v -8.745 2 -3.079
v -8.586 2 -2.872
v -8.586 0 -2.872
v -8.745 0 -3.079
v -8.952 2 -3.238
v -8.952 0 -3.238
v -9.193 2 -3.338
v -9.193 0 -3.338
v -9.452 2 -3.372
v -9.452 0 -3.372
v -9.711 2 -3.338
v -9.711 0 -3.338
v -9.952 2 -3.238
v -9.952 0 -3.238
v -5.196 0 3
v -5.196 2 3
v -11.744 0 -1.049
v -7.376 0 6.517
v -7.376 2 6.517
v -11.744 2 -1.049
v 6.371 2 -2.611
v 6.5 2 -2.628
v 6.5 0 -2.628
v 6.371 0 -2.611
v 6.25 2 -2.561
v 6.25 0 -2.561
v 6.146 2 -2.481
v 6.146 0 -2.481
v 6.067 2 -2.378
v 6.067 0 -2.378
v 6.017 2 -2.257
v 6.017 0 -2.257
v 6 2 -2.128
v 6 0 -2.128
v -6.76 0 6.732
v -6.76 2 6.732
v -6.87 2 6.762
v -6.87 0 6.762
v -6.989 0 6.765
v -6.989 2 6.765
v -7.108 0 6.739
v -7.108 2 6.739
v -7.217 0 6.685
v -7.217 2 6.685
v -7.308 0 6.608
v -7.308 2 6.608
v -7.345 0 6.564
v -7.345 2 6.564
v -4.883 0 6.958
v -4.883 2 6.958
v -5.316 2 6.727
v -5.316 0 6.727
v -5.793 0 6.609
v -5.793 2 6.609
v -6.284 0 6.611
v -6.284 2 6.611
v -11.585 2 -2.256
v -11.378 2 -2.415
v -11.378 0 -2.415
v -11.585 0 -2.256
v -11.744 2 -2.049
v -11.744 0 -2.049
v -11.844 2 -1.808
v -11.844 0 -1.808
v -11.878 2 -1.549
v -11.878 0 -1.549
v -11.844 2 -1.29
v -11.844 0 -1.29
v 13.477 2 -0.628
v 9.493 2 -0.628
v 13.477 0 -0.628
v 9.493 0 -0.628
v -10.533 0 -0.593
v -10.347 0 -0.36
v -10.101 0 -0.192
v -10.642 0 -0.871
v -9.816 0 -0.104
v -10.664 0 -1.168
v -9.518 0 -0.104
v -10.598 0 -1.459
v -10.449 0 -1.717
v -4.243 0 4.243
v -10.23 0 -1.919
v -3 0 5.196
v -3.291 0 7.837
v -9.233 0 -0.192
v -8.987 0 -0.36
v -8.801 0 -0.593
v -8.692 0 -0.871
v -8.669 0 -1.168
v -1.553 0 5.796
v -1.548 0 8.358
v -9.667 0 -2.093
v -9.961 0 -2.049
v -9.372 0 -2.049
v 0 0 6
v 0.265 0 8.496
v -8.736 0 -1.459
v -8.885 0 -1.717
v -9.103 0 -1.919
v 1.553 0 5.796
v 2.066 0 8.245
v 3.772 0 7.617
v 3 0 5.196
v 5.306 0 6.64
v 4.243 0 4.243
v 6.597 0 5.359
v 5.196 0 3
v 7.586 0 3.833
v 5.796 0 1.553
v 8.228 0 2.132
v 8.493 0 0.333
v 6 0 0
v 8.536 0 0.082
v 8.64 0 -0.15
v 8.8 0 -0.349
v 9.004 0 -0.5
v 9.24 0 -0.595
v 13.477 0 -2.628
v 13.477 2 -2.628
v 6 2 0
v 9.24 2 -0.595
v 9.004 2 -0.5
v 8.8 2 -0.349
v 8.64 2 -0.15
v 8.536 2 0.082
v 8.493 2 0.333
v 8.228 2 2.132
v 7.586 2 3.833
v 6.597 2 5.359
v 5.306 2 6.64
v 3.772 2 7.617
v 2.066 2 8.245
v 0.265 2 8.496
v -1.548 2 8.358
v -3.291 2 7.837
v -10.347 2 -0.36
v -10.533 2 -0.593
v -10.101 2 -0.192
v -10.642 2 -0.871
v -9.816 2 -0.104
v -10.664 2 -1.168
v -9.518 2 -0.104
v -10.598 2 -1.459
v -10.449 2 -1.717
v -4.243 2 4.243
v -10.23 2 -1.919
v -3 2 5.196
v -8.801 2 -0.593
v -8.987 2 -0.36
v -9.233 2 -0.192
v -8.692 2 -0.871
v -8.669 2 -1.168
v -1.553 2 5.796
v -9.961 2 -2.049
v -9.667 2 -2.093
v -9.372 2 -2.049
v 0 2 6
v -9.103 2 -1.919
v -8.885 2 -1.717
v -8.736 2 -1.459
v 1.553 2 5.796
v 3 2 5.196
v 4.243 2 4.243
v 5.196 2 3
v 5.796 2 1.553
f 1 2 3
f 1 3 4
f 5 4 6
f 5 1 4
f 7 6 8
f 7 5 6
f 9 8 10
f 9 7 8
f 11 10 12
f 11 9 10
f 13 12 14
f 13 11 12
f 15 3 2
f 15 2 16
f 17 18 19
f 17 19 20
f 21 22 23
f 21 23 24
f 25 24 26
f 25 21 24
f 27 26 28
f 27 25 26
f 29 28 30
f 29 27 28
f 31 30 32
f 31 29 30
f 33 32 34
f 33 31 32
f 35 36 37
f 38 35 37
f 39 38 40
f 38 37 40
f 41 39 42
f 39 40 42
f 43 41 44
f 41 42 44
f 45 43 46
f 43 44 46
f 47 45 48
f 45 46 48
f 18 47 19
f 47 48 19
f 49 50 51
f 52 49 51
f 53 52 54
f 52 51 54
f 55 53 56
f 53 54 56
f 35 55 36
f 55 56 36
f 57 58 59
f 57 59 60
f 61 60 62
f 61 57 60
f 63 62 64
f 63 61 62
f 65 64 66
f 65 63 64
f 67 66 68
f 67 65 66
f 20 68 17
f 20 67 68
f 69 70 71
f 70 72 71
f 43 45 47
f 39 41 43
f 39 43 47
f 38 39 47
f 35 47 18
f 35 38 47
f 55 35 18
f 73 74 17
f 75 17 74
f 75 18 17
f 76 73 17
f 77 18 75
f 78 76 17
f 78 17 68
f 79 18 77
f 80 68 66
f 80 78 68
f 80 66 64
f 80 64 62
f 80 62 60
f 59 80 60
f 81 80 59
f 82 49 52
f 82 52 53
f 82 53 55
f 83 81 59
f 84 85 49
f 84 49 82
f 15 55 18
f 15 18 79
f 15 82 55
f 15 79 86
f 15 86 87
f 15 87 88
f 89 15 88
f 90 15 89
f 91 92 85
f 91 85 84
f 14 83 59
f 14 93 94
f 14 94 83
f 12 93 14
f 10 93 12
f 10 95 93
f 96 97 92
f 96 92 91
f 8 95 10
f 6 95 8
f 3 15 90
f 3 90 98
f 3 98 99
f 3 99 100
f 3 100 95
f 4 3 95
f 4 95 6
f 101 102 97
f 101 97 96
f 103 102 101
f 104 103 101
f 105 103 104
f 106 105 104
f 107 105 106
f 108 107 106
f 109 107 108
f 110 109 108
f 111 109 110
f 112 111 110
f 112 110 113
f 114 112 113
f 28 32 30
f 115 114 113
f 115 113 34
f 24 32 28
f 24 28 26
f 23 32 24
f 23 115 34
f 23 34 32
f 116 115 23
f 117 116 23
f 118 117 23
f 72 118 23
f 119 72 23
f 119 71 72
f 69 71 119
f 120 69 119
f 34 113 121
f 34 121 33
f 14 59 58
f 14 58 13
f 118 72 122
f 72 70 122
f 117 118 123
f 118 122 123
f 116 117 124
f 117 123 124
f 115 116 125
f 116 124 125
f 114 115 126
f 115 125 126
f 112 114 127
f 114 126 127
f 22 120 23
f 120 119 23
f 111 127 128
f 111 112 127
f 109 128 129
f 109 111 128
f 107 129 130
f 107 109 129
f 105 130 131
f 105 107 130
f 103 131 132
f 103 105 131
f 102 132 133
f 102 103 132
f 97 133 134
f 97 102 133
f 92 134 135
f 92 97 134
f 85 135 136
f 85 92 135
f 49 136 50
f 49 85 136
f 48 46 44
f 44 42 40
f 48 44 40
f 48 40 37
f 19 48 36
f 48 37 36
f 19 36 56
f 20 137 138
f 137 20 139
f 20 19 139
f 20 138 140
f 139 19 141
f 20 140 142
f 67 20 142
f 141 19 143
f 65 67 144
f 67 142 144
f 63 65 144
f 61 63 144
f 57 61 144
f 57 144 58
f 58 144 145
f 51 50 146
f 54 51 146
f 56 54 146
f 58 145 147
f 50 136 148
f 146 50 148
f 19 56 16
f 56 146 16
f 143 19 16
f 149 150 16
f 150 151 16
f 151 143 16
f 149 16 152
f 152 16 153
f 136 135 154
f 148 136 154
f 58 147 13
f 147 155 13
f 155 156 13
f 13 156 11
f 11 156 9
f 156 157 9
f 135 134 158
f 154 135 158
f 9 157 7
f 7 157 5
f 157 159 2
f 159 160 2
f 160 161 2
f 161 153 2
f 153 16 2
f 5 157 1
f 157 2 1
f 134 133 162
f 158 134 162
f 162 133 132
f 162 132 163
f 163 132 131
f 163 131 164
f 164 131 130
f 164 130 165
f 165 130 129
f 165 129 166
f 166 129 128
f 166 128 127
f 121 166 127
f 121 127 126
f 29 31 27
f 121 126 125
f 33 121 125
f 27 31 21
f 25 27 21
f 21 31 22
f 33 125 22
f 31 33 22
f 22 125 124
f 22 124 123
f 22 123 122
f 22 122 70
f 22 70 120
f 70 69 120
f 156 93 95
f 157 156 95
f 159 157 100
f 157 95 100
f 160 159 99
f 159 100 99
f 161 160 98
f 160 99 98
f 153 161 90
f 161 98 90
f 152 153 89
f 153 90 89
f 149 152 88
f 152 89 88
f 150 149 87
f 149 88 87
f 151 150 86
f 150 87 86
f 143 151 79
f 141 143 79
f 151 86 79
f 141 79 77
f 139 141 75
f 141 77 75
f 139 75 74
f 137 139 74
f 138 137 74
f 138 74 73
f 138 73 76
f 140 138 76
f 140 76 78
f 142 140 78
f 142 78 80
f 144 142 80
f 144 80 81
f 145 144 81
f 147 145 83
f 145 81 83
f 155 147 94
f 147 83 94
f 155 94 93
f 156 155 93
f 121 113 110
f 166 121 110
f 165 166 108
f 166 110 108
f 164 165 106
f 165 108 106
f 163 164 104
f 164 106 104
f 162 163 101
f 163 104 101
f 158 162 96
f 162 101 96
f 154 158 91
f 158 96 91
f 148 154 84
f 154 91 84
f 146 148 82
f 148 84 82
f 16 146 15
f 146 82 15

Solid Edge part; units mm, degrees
sketch "Sketch1" plane through (0, 0, 0) normal (0, -1, 0) x (1, 0, 0)
  line L0 (-5.8407, 6.1754) -> (-7.1398, 6.9254)
  line L1 (-7.1398, 6.9254) -> (-12.2436, -1.9148)
  line L2 (-12.2436, -1.9148) -> (-9.0862, -3.7377)
  line L3 (-9.0862, -3.7377) -> (-5.1962, 3)
  line L4 (6, 0) -> (6, -2.6279)
  line L5 (13.4768, -2.6279) -> (6, -2.6279)
  line L6 (13.4768, -0.6279) -> (13.4768, -2.6279)
  line L7 (8.4768, -0.6279) -> (13.4768, -0.6279)
  arc A0 (8.4768, -0.6279) -> (-5.8407, 6.1754) centre (0, 0) ccw
  arc A1 (-5.1962, 3) -> (6, 0) centre (0, 0) cw
  dimension "D1" = 12
  dimension "D2" = 17
  dimension "D3" = 1.5
  dimension "D4" = 2
  dimension "D5" = 5
  dimension "D6" = 2.6279
  dimension "D7" = 7.4768
  dimension "D8" = 6.4902
  dimension "D9" = 3.6459
  dimension "D10" = 7.7801
  dimension "D11" = 10.2078
extrude "Protrusion1" add sketch "Sketch1" against normal blind 2
fillet "Round_1" radius 1 1 edges at (8.4768, 1, -0.6279)
fillet "Round_2" radius 0.5 1 edges at (6, 1, -2.6279)
fillet "Round_3" radius 2 1 edges at (-5.8407, 1, 6.1754)
fillet "Round_4" radius 0.5 1 edges at (-7.1398, 1, 6.9254)
hole "Hole___body" at (-9.6667, 0, -1.0932) direction (0, 1, 0) diameter 2 end up to next
fillet "Round_5" radius 1 2 edges at (-9.0862, 1, -3.7377) (-12.2436, 1, -1.9148)
properties material "ABS Plastic, high impact"
